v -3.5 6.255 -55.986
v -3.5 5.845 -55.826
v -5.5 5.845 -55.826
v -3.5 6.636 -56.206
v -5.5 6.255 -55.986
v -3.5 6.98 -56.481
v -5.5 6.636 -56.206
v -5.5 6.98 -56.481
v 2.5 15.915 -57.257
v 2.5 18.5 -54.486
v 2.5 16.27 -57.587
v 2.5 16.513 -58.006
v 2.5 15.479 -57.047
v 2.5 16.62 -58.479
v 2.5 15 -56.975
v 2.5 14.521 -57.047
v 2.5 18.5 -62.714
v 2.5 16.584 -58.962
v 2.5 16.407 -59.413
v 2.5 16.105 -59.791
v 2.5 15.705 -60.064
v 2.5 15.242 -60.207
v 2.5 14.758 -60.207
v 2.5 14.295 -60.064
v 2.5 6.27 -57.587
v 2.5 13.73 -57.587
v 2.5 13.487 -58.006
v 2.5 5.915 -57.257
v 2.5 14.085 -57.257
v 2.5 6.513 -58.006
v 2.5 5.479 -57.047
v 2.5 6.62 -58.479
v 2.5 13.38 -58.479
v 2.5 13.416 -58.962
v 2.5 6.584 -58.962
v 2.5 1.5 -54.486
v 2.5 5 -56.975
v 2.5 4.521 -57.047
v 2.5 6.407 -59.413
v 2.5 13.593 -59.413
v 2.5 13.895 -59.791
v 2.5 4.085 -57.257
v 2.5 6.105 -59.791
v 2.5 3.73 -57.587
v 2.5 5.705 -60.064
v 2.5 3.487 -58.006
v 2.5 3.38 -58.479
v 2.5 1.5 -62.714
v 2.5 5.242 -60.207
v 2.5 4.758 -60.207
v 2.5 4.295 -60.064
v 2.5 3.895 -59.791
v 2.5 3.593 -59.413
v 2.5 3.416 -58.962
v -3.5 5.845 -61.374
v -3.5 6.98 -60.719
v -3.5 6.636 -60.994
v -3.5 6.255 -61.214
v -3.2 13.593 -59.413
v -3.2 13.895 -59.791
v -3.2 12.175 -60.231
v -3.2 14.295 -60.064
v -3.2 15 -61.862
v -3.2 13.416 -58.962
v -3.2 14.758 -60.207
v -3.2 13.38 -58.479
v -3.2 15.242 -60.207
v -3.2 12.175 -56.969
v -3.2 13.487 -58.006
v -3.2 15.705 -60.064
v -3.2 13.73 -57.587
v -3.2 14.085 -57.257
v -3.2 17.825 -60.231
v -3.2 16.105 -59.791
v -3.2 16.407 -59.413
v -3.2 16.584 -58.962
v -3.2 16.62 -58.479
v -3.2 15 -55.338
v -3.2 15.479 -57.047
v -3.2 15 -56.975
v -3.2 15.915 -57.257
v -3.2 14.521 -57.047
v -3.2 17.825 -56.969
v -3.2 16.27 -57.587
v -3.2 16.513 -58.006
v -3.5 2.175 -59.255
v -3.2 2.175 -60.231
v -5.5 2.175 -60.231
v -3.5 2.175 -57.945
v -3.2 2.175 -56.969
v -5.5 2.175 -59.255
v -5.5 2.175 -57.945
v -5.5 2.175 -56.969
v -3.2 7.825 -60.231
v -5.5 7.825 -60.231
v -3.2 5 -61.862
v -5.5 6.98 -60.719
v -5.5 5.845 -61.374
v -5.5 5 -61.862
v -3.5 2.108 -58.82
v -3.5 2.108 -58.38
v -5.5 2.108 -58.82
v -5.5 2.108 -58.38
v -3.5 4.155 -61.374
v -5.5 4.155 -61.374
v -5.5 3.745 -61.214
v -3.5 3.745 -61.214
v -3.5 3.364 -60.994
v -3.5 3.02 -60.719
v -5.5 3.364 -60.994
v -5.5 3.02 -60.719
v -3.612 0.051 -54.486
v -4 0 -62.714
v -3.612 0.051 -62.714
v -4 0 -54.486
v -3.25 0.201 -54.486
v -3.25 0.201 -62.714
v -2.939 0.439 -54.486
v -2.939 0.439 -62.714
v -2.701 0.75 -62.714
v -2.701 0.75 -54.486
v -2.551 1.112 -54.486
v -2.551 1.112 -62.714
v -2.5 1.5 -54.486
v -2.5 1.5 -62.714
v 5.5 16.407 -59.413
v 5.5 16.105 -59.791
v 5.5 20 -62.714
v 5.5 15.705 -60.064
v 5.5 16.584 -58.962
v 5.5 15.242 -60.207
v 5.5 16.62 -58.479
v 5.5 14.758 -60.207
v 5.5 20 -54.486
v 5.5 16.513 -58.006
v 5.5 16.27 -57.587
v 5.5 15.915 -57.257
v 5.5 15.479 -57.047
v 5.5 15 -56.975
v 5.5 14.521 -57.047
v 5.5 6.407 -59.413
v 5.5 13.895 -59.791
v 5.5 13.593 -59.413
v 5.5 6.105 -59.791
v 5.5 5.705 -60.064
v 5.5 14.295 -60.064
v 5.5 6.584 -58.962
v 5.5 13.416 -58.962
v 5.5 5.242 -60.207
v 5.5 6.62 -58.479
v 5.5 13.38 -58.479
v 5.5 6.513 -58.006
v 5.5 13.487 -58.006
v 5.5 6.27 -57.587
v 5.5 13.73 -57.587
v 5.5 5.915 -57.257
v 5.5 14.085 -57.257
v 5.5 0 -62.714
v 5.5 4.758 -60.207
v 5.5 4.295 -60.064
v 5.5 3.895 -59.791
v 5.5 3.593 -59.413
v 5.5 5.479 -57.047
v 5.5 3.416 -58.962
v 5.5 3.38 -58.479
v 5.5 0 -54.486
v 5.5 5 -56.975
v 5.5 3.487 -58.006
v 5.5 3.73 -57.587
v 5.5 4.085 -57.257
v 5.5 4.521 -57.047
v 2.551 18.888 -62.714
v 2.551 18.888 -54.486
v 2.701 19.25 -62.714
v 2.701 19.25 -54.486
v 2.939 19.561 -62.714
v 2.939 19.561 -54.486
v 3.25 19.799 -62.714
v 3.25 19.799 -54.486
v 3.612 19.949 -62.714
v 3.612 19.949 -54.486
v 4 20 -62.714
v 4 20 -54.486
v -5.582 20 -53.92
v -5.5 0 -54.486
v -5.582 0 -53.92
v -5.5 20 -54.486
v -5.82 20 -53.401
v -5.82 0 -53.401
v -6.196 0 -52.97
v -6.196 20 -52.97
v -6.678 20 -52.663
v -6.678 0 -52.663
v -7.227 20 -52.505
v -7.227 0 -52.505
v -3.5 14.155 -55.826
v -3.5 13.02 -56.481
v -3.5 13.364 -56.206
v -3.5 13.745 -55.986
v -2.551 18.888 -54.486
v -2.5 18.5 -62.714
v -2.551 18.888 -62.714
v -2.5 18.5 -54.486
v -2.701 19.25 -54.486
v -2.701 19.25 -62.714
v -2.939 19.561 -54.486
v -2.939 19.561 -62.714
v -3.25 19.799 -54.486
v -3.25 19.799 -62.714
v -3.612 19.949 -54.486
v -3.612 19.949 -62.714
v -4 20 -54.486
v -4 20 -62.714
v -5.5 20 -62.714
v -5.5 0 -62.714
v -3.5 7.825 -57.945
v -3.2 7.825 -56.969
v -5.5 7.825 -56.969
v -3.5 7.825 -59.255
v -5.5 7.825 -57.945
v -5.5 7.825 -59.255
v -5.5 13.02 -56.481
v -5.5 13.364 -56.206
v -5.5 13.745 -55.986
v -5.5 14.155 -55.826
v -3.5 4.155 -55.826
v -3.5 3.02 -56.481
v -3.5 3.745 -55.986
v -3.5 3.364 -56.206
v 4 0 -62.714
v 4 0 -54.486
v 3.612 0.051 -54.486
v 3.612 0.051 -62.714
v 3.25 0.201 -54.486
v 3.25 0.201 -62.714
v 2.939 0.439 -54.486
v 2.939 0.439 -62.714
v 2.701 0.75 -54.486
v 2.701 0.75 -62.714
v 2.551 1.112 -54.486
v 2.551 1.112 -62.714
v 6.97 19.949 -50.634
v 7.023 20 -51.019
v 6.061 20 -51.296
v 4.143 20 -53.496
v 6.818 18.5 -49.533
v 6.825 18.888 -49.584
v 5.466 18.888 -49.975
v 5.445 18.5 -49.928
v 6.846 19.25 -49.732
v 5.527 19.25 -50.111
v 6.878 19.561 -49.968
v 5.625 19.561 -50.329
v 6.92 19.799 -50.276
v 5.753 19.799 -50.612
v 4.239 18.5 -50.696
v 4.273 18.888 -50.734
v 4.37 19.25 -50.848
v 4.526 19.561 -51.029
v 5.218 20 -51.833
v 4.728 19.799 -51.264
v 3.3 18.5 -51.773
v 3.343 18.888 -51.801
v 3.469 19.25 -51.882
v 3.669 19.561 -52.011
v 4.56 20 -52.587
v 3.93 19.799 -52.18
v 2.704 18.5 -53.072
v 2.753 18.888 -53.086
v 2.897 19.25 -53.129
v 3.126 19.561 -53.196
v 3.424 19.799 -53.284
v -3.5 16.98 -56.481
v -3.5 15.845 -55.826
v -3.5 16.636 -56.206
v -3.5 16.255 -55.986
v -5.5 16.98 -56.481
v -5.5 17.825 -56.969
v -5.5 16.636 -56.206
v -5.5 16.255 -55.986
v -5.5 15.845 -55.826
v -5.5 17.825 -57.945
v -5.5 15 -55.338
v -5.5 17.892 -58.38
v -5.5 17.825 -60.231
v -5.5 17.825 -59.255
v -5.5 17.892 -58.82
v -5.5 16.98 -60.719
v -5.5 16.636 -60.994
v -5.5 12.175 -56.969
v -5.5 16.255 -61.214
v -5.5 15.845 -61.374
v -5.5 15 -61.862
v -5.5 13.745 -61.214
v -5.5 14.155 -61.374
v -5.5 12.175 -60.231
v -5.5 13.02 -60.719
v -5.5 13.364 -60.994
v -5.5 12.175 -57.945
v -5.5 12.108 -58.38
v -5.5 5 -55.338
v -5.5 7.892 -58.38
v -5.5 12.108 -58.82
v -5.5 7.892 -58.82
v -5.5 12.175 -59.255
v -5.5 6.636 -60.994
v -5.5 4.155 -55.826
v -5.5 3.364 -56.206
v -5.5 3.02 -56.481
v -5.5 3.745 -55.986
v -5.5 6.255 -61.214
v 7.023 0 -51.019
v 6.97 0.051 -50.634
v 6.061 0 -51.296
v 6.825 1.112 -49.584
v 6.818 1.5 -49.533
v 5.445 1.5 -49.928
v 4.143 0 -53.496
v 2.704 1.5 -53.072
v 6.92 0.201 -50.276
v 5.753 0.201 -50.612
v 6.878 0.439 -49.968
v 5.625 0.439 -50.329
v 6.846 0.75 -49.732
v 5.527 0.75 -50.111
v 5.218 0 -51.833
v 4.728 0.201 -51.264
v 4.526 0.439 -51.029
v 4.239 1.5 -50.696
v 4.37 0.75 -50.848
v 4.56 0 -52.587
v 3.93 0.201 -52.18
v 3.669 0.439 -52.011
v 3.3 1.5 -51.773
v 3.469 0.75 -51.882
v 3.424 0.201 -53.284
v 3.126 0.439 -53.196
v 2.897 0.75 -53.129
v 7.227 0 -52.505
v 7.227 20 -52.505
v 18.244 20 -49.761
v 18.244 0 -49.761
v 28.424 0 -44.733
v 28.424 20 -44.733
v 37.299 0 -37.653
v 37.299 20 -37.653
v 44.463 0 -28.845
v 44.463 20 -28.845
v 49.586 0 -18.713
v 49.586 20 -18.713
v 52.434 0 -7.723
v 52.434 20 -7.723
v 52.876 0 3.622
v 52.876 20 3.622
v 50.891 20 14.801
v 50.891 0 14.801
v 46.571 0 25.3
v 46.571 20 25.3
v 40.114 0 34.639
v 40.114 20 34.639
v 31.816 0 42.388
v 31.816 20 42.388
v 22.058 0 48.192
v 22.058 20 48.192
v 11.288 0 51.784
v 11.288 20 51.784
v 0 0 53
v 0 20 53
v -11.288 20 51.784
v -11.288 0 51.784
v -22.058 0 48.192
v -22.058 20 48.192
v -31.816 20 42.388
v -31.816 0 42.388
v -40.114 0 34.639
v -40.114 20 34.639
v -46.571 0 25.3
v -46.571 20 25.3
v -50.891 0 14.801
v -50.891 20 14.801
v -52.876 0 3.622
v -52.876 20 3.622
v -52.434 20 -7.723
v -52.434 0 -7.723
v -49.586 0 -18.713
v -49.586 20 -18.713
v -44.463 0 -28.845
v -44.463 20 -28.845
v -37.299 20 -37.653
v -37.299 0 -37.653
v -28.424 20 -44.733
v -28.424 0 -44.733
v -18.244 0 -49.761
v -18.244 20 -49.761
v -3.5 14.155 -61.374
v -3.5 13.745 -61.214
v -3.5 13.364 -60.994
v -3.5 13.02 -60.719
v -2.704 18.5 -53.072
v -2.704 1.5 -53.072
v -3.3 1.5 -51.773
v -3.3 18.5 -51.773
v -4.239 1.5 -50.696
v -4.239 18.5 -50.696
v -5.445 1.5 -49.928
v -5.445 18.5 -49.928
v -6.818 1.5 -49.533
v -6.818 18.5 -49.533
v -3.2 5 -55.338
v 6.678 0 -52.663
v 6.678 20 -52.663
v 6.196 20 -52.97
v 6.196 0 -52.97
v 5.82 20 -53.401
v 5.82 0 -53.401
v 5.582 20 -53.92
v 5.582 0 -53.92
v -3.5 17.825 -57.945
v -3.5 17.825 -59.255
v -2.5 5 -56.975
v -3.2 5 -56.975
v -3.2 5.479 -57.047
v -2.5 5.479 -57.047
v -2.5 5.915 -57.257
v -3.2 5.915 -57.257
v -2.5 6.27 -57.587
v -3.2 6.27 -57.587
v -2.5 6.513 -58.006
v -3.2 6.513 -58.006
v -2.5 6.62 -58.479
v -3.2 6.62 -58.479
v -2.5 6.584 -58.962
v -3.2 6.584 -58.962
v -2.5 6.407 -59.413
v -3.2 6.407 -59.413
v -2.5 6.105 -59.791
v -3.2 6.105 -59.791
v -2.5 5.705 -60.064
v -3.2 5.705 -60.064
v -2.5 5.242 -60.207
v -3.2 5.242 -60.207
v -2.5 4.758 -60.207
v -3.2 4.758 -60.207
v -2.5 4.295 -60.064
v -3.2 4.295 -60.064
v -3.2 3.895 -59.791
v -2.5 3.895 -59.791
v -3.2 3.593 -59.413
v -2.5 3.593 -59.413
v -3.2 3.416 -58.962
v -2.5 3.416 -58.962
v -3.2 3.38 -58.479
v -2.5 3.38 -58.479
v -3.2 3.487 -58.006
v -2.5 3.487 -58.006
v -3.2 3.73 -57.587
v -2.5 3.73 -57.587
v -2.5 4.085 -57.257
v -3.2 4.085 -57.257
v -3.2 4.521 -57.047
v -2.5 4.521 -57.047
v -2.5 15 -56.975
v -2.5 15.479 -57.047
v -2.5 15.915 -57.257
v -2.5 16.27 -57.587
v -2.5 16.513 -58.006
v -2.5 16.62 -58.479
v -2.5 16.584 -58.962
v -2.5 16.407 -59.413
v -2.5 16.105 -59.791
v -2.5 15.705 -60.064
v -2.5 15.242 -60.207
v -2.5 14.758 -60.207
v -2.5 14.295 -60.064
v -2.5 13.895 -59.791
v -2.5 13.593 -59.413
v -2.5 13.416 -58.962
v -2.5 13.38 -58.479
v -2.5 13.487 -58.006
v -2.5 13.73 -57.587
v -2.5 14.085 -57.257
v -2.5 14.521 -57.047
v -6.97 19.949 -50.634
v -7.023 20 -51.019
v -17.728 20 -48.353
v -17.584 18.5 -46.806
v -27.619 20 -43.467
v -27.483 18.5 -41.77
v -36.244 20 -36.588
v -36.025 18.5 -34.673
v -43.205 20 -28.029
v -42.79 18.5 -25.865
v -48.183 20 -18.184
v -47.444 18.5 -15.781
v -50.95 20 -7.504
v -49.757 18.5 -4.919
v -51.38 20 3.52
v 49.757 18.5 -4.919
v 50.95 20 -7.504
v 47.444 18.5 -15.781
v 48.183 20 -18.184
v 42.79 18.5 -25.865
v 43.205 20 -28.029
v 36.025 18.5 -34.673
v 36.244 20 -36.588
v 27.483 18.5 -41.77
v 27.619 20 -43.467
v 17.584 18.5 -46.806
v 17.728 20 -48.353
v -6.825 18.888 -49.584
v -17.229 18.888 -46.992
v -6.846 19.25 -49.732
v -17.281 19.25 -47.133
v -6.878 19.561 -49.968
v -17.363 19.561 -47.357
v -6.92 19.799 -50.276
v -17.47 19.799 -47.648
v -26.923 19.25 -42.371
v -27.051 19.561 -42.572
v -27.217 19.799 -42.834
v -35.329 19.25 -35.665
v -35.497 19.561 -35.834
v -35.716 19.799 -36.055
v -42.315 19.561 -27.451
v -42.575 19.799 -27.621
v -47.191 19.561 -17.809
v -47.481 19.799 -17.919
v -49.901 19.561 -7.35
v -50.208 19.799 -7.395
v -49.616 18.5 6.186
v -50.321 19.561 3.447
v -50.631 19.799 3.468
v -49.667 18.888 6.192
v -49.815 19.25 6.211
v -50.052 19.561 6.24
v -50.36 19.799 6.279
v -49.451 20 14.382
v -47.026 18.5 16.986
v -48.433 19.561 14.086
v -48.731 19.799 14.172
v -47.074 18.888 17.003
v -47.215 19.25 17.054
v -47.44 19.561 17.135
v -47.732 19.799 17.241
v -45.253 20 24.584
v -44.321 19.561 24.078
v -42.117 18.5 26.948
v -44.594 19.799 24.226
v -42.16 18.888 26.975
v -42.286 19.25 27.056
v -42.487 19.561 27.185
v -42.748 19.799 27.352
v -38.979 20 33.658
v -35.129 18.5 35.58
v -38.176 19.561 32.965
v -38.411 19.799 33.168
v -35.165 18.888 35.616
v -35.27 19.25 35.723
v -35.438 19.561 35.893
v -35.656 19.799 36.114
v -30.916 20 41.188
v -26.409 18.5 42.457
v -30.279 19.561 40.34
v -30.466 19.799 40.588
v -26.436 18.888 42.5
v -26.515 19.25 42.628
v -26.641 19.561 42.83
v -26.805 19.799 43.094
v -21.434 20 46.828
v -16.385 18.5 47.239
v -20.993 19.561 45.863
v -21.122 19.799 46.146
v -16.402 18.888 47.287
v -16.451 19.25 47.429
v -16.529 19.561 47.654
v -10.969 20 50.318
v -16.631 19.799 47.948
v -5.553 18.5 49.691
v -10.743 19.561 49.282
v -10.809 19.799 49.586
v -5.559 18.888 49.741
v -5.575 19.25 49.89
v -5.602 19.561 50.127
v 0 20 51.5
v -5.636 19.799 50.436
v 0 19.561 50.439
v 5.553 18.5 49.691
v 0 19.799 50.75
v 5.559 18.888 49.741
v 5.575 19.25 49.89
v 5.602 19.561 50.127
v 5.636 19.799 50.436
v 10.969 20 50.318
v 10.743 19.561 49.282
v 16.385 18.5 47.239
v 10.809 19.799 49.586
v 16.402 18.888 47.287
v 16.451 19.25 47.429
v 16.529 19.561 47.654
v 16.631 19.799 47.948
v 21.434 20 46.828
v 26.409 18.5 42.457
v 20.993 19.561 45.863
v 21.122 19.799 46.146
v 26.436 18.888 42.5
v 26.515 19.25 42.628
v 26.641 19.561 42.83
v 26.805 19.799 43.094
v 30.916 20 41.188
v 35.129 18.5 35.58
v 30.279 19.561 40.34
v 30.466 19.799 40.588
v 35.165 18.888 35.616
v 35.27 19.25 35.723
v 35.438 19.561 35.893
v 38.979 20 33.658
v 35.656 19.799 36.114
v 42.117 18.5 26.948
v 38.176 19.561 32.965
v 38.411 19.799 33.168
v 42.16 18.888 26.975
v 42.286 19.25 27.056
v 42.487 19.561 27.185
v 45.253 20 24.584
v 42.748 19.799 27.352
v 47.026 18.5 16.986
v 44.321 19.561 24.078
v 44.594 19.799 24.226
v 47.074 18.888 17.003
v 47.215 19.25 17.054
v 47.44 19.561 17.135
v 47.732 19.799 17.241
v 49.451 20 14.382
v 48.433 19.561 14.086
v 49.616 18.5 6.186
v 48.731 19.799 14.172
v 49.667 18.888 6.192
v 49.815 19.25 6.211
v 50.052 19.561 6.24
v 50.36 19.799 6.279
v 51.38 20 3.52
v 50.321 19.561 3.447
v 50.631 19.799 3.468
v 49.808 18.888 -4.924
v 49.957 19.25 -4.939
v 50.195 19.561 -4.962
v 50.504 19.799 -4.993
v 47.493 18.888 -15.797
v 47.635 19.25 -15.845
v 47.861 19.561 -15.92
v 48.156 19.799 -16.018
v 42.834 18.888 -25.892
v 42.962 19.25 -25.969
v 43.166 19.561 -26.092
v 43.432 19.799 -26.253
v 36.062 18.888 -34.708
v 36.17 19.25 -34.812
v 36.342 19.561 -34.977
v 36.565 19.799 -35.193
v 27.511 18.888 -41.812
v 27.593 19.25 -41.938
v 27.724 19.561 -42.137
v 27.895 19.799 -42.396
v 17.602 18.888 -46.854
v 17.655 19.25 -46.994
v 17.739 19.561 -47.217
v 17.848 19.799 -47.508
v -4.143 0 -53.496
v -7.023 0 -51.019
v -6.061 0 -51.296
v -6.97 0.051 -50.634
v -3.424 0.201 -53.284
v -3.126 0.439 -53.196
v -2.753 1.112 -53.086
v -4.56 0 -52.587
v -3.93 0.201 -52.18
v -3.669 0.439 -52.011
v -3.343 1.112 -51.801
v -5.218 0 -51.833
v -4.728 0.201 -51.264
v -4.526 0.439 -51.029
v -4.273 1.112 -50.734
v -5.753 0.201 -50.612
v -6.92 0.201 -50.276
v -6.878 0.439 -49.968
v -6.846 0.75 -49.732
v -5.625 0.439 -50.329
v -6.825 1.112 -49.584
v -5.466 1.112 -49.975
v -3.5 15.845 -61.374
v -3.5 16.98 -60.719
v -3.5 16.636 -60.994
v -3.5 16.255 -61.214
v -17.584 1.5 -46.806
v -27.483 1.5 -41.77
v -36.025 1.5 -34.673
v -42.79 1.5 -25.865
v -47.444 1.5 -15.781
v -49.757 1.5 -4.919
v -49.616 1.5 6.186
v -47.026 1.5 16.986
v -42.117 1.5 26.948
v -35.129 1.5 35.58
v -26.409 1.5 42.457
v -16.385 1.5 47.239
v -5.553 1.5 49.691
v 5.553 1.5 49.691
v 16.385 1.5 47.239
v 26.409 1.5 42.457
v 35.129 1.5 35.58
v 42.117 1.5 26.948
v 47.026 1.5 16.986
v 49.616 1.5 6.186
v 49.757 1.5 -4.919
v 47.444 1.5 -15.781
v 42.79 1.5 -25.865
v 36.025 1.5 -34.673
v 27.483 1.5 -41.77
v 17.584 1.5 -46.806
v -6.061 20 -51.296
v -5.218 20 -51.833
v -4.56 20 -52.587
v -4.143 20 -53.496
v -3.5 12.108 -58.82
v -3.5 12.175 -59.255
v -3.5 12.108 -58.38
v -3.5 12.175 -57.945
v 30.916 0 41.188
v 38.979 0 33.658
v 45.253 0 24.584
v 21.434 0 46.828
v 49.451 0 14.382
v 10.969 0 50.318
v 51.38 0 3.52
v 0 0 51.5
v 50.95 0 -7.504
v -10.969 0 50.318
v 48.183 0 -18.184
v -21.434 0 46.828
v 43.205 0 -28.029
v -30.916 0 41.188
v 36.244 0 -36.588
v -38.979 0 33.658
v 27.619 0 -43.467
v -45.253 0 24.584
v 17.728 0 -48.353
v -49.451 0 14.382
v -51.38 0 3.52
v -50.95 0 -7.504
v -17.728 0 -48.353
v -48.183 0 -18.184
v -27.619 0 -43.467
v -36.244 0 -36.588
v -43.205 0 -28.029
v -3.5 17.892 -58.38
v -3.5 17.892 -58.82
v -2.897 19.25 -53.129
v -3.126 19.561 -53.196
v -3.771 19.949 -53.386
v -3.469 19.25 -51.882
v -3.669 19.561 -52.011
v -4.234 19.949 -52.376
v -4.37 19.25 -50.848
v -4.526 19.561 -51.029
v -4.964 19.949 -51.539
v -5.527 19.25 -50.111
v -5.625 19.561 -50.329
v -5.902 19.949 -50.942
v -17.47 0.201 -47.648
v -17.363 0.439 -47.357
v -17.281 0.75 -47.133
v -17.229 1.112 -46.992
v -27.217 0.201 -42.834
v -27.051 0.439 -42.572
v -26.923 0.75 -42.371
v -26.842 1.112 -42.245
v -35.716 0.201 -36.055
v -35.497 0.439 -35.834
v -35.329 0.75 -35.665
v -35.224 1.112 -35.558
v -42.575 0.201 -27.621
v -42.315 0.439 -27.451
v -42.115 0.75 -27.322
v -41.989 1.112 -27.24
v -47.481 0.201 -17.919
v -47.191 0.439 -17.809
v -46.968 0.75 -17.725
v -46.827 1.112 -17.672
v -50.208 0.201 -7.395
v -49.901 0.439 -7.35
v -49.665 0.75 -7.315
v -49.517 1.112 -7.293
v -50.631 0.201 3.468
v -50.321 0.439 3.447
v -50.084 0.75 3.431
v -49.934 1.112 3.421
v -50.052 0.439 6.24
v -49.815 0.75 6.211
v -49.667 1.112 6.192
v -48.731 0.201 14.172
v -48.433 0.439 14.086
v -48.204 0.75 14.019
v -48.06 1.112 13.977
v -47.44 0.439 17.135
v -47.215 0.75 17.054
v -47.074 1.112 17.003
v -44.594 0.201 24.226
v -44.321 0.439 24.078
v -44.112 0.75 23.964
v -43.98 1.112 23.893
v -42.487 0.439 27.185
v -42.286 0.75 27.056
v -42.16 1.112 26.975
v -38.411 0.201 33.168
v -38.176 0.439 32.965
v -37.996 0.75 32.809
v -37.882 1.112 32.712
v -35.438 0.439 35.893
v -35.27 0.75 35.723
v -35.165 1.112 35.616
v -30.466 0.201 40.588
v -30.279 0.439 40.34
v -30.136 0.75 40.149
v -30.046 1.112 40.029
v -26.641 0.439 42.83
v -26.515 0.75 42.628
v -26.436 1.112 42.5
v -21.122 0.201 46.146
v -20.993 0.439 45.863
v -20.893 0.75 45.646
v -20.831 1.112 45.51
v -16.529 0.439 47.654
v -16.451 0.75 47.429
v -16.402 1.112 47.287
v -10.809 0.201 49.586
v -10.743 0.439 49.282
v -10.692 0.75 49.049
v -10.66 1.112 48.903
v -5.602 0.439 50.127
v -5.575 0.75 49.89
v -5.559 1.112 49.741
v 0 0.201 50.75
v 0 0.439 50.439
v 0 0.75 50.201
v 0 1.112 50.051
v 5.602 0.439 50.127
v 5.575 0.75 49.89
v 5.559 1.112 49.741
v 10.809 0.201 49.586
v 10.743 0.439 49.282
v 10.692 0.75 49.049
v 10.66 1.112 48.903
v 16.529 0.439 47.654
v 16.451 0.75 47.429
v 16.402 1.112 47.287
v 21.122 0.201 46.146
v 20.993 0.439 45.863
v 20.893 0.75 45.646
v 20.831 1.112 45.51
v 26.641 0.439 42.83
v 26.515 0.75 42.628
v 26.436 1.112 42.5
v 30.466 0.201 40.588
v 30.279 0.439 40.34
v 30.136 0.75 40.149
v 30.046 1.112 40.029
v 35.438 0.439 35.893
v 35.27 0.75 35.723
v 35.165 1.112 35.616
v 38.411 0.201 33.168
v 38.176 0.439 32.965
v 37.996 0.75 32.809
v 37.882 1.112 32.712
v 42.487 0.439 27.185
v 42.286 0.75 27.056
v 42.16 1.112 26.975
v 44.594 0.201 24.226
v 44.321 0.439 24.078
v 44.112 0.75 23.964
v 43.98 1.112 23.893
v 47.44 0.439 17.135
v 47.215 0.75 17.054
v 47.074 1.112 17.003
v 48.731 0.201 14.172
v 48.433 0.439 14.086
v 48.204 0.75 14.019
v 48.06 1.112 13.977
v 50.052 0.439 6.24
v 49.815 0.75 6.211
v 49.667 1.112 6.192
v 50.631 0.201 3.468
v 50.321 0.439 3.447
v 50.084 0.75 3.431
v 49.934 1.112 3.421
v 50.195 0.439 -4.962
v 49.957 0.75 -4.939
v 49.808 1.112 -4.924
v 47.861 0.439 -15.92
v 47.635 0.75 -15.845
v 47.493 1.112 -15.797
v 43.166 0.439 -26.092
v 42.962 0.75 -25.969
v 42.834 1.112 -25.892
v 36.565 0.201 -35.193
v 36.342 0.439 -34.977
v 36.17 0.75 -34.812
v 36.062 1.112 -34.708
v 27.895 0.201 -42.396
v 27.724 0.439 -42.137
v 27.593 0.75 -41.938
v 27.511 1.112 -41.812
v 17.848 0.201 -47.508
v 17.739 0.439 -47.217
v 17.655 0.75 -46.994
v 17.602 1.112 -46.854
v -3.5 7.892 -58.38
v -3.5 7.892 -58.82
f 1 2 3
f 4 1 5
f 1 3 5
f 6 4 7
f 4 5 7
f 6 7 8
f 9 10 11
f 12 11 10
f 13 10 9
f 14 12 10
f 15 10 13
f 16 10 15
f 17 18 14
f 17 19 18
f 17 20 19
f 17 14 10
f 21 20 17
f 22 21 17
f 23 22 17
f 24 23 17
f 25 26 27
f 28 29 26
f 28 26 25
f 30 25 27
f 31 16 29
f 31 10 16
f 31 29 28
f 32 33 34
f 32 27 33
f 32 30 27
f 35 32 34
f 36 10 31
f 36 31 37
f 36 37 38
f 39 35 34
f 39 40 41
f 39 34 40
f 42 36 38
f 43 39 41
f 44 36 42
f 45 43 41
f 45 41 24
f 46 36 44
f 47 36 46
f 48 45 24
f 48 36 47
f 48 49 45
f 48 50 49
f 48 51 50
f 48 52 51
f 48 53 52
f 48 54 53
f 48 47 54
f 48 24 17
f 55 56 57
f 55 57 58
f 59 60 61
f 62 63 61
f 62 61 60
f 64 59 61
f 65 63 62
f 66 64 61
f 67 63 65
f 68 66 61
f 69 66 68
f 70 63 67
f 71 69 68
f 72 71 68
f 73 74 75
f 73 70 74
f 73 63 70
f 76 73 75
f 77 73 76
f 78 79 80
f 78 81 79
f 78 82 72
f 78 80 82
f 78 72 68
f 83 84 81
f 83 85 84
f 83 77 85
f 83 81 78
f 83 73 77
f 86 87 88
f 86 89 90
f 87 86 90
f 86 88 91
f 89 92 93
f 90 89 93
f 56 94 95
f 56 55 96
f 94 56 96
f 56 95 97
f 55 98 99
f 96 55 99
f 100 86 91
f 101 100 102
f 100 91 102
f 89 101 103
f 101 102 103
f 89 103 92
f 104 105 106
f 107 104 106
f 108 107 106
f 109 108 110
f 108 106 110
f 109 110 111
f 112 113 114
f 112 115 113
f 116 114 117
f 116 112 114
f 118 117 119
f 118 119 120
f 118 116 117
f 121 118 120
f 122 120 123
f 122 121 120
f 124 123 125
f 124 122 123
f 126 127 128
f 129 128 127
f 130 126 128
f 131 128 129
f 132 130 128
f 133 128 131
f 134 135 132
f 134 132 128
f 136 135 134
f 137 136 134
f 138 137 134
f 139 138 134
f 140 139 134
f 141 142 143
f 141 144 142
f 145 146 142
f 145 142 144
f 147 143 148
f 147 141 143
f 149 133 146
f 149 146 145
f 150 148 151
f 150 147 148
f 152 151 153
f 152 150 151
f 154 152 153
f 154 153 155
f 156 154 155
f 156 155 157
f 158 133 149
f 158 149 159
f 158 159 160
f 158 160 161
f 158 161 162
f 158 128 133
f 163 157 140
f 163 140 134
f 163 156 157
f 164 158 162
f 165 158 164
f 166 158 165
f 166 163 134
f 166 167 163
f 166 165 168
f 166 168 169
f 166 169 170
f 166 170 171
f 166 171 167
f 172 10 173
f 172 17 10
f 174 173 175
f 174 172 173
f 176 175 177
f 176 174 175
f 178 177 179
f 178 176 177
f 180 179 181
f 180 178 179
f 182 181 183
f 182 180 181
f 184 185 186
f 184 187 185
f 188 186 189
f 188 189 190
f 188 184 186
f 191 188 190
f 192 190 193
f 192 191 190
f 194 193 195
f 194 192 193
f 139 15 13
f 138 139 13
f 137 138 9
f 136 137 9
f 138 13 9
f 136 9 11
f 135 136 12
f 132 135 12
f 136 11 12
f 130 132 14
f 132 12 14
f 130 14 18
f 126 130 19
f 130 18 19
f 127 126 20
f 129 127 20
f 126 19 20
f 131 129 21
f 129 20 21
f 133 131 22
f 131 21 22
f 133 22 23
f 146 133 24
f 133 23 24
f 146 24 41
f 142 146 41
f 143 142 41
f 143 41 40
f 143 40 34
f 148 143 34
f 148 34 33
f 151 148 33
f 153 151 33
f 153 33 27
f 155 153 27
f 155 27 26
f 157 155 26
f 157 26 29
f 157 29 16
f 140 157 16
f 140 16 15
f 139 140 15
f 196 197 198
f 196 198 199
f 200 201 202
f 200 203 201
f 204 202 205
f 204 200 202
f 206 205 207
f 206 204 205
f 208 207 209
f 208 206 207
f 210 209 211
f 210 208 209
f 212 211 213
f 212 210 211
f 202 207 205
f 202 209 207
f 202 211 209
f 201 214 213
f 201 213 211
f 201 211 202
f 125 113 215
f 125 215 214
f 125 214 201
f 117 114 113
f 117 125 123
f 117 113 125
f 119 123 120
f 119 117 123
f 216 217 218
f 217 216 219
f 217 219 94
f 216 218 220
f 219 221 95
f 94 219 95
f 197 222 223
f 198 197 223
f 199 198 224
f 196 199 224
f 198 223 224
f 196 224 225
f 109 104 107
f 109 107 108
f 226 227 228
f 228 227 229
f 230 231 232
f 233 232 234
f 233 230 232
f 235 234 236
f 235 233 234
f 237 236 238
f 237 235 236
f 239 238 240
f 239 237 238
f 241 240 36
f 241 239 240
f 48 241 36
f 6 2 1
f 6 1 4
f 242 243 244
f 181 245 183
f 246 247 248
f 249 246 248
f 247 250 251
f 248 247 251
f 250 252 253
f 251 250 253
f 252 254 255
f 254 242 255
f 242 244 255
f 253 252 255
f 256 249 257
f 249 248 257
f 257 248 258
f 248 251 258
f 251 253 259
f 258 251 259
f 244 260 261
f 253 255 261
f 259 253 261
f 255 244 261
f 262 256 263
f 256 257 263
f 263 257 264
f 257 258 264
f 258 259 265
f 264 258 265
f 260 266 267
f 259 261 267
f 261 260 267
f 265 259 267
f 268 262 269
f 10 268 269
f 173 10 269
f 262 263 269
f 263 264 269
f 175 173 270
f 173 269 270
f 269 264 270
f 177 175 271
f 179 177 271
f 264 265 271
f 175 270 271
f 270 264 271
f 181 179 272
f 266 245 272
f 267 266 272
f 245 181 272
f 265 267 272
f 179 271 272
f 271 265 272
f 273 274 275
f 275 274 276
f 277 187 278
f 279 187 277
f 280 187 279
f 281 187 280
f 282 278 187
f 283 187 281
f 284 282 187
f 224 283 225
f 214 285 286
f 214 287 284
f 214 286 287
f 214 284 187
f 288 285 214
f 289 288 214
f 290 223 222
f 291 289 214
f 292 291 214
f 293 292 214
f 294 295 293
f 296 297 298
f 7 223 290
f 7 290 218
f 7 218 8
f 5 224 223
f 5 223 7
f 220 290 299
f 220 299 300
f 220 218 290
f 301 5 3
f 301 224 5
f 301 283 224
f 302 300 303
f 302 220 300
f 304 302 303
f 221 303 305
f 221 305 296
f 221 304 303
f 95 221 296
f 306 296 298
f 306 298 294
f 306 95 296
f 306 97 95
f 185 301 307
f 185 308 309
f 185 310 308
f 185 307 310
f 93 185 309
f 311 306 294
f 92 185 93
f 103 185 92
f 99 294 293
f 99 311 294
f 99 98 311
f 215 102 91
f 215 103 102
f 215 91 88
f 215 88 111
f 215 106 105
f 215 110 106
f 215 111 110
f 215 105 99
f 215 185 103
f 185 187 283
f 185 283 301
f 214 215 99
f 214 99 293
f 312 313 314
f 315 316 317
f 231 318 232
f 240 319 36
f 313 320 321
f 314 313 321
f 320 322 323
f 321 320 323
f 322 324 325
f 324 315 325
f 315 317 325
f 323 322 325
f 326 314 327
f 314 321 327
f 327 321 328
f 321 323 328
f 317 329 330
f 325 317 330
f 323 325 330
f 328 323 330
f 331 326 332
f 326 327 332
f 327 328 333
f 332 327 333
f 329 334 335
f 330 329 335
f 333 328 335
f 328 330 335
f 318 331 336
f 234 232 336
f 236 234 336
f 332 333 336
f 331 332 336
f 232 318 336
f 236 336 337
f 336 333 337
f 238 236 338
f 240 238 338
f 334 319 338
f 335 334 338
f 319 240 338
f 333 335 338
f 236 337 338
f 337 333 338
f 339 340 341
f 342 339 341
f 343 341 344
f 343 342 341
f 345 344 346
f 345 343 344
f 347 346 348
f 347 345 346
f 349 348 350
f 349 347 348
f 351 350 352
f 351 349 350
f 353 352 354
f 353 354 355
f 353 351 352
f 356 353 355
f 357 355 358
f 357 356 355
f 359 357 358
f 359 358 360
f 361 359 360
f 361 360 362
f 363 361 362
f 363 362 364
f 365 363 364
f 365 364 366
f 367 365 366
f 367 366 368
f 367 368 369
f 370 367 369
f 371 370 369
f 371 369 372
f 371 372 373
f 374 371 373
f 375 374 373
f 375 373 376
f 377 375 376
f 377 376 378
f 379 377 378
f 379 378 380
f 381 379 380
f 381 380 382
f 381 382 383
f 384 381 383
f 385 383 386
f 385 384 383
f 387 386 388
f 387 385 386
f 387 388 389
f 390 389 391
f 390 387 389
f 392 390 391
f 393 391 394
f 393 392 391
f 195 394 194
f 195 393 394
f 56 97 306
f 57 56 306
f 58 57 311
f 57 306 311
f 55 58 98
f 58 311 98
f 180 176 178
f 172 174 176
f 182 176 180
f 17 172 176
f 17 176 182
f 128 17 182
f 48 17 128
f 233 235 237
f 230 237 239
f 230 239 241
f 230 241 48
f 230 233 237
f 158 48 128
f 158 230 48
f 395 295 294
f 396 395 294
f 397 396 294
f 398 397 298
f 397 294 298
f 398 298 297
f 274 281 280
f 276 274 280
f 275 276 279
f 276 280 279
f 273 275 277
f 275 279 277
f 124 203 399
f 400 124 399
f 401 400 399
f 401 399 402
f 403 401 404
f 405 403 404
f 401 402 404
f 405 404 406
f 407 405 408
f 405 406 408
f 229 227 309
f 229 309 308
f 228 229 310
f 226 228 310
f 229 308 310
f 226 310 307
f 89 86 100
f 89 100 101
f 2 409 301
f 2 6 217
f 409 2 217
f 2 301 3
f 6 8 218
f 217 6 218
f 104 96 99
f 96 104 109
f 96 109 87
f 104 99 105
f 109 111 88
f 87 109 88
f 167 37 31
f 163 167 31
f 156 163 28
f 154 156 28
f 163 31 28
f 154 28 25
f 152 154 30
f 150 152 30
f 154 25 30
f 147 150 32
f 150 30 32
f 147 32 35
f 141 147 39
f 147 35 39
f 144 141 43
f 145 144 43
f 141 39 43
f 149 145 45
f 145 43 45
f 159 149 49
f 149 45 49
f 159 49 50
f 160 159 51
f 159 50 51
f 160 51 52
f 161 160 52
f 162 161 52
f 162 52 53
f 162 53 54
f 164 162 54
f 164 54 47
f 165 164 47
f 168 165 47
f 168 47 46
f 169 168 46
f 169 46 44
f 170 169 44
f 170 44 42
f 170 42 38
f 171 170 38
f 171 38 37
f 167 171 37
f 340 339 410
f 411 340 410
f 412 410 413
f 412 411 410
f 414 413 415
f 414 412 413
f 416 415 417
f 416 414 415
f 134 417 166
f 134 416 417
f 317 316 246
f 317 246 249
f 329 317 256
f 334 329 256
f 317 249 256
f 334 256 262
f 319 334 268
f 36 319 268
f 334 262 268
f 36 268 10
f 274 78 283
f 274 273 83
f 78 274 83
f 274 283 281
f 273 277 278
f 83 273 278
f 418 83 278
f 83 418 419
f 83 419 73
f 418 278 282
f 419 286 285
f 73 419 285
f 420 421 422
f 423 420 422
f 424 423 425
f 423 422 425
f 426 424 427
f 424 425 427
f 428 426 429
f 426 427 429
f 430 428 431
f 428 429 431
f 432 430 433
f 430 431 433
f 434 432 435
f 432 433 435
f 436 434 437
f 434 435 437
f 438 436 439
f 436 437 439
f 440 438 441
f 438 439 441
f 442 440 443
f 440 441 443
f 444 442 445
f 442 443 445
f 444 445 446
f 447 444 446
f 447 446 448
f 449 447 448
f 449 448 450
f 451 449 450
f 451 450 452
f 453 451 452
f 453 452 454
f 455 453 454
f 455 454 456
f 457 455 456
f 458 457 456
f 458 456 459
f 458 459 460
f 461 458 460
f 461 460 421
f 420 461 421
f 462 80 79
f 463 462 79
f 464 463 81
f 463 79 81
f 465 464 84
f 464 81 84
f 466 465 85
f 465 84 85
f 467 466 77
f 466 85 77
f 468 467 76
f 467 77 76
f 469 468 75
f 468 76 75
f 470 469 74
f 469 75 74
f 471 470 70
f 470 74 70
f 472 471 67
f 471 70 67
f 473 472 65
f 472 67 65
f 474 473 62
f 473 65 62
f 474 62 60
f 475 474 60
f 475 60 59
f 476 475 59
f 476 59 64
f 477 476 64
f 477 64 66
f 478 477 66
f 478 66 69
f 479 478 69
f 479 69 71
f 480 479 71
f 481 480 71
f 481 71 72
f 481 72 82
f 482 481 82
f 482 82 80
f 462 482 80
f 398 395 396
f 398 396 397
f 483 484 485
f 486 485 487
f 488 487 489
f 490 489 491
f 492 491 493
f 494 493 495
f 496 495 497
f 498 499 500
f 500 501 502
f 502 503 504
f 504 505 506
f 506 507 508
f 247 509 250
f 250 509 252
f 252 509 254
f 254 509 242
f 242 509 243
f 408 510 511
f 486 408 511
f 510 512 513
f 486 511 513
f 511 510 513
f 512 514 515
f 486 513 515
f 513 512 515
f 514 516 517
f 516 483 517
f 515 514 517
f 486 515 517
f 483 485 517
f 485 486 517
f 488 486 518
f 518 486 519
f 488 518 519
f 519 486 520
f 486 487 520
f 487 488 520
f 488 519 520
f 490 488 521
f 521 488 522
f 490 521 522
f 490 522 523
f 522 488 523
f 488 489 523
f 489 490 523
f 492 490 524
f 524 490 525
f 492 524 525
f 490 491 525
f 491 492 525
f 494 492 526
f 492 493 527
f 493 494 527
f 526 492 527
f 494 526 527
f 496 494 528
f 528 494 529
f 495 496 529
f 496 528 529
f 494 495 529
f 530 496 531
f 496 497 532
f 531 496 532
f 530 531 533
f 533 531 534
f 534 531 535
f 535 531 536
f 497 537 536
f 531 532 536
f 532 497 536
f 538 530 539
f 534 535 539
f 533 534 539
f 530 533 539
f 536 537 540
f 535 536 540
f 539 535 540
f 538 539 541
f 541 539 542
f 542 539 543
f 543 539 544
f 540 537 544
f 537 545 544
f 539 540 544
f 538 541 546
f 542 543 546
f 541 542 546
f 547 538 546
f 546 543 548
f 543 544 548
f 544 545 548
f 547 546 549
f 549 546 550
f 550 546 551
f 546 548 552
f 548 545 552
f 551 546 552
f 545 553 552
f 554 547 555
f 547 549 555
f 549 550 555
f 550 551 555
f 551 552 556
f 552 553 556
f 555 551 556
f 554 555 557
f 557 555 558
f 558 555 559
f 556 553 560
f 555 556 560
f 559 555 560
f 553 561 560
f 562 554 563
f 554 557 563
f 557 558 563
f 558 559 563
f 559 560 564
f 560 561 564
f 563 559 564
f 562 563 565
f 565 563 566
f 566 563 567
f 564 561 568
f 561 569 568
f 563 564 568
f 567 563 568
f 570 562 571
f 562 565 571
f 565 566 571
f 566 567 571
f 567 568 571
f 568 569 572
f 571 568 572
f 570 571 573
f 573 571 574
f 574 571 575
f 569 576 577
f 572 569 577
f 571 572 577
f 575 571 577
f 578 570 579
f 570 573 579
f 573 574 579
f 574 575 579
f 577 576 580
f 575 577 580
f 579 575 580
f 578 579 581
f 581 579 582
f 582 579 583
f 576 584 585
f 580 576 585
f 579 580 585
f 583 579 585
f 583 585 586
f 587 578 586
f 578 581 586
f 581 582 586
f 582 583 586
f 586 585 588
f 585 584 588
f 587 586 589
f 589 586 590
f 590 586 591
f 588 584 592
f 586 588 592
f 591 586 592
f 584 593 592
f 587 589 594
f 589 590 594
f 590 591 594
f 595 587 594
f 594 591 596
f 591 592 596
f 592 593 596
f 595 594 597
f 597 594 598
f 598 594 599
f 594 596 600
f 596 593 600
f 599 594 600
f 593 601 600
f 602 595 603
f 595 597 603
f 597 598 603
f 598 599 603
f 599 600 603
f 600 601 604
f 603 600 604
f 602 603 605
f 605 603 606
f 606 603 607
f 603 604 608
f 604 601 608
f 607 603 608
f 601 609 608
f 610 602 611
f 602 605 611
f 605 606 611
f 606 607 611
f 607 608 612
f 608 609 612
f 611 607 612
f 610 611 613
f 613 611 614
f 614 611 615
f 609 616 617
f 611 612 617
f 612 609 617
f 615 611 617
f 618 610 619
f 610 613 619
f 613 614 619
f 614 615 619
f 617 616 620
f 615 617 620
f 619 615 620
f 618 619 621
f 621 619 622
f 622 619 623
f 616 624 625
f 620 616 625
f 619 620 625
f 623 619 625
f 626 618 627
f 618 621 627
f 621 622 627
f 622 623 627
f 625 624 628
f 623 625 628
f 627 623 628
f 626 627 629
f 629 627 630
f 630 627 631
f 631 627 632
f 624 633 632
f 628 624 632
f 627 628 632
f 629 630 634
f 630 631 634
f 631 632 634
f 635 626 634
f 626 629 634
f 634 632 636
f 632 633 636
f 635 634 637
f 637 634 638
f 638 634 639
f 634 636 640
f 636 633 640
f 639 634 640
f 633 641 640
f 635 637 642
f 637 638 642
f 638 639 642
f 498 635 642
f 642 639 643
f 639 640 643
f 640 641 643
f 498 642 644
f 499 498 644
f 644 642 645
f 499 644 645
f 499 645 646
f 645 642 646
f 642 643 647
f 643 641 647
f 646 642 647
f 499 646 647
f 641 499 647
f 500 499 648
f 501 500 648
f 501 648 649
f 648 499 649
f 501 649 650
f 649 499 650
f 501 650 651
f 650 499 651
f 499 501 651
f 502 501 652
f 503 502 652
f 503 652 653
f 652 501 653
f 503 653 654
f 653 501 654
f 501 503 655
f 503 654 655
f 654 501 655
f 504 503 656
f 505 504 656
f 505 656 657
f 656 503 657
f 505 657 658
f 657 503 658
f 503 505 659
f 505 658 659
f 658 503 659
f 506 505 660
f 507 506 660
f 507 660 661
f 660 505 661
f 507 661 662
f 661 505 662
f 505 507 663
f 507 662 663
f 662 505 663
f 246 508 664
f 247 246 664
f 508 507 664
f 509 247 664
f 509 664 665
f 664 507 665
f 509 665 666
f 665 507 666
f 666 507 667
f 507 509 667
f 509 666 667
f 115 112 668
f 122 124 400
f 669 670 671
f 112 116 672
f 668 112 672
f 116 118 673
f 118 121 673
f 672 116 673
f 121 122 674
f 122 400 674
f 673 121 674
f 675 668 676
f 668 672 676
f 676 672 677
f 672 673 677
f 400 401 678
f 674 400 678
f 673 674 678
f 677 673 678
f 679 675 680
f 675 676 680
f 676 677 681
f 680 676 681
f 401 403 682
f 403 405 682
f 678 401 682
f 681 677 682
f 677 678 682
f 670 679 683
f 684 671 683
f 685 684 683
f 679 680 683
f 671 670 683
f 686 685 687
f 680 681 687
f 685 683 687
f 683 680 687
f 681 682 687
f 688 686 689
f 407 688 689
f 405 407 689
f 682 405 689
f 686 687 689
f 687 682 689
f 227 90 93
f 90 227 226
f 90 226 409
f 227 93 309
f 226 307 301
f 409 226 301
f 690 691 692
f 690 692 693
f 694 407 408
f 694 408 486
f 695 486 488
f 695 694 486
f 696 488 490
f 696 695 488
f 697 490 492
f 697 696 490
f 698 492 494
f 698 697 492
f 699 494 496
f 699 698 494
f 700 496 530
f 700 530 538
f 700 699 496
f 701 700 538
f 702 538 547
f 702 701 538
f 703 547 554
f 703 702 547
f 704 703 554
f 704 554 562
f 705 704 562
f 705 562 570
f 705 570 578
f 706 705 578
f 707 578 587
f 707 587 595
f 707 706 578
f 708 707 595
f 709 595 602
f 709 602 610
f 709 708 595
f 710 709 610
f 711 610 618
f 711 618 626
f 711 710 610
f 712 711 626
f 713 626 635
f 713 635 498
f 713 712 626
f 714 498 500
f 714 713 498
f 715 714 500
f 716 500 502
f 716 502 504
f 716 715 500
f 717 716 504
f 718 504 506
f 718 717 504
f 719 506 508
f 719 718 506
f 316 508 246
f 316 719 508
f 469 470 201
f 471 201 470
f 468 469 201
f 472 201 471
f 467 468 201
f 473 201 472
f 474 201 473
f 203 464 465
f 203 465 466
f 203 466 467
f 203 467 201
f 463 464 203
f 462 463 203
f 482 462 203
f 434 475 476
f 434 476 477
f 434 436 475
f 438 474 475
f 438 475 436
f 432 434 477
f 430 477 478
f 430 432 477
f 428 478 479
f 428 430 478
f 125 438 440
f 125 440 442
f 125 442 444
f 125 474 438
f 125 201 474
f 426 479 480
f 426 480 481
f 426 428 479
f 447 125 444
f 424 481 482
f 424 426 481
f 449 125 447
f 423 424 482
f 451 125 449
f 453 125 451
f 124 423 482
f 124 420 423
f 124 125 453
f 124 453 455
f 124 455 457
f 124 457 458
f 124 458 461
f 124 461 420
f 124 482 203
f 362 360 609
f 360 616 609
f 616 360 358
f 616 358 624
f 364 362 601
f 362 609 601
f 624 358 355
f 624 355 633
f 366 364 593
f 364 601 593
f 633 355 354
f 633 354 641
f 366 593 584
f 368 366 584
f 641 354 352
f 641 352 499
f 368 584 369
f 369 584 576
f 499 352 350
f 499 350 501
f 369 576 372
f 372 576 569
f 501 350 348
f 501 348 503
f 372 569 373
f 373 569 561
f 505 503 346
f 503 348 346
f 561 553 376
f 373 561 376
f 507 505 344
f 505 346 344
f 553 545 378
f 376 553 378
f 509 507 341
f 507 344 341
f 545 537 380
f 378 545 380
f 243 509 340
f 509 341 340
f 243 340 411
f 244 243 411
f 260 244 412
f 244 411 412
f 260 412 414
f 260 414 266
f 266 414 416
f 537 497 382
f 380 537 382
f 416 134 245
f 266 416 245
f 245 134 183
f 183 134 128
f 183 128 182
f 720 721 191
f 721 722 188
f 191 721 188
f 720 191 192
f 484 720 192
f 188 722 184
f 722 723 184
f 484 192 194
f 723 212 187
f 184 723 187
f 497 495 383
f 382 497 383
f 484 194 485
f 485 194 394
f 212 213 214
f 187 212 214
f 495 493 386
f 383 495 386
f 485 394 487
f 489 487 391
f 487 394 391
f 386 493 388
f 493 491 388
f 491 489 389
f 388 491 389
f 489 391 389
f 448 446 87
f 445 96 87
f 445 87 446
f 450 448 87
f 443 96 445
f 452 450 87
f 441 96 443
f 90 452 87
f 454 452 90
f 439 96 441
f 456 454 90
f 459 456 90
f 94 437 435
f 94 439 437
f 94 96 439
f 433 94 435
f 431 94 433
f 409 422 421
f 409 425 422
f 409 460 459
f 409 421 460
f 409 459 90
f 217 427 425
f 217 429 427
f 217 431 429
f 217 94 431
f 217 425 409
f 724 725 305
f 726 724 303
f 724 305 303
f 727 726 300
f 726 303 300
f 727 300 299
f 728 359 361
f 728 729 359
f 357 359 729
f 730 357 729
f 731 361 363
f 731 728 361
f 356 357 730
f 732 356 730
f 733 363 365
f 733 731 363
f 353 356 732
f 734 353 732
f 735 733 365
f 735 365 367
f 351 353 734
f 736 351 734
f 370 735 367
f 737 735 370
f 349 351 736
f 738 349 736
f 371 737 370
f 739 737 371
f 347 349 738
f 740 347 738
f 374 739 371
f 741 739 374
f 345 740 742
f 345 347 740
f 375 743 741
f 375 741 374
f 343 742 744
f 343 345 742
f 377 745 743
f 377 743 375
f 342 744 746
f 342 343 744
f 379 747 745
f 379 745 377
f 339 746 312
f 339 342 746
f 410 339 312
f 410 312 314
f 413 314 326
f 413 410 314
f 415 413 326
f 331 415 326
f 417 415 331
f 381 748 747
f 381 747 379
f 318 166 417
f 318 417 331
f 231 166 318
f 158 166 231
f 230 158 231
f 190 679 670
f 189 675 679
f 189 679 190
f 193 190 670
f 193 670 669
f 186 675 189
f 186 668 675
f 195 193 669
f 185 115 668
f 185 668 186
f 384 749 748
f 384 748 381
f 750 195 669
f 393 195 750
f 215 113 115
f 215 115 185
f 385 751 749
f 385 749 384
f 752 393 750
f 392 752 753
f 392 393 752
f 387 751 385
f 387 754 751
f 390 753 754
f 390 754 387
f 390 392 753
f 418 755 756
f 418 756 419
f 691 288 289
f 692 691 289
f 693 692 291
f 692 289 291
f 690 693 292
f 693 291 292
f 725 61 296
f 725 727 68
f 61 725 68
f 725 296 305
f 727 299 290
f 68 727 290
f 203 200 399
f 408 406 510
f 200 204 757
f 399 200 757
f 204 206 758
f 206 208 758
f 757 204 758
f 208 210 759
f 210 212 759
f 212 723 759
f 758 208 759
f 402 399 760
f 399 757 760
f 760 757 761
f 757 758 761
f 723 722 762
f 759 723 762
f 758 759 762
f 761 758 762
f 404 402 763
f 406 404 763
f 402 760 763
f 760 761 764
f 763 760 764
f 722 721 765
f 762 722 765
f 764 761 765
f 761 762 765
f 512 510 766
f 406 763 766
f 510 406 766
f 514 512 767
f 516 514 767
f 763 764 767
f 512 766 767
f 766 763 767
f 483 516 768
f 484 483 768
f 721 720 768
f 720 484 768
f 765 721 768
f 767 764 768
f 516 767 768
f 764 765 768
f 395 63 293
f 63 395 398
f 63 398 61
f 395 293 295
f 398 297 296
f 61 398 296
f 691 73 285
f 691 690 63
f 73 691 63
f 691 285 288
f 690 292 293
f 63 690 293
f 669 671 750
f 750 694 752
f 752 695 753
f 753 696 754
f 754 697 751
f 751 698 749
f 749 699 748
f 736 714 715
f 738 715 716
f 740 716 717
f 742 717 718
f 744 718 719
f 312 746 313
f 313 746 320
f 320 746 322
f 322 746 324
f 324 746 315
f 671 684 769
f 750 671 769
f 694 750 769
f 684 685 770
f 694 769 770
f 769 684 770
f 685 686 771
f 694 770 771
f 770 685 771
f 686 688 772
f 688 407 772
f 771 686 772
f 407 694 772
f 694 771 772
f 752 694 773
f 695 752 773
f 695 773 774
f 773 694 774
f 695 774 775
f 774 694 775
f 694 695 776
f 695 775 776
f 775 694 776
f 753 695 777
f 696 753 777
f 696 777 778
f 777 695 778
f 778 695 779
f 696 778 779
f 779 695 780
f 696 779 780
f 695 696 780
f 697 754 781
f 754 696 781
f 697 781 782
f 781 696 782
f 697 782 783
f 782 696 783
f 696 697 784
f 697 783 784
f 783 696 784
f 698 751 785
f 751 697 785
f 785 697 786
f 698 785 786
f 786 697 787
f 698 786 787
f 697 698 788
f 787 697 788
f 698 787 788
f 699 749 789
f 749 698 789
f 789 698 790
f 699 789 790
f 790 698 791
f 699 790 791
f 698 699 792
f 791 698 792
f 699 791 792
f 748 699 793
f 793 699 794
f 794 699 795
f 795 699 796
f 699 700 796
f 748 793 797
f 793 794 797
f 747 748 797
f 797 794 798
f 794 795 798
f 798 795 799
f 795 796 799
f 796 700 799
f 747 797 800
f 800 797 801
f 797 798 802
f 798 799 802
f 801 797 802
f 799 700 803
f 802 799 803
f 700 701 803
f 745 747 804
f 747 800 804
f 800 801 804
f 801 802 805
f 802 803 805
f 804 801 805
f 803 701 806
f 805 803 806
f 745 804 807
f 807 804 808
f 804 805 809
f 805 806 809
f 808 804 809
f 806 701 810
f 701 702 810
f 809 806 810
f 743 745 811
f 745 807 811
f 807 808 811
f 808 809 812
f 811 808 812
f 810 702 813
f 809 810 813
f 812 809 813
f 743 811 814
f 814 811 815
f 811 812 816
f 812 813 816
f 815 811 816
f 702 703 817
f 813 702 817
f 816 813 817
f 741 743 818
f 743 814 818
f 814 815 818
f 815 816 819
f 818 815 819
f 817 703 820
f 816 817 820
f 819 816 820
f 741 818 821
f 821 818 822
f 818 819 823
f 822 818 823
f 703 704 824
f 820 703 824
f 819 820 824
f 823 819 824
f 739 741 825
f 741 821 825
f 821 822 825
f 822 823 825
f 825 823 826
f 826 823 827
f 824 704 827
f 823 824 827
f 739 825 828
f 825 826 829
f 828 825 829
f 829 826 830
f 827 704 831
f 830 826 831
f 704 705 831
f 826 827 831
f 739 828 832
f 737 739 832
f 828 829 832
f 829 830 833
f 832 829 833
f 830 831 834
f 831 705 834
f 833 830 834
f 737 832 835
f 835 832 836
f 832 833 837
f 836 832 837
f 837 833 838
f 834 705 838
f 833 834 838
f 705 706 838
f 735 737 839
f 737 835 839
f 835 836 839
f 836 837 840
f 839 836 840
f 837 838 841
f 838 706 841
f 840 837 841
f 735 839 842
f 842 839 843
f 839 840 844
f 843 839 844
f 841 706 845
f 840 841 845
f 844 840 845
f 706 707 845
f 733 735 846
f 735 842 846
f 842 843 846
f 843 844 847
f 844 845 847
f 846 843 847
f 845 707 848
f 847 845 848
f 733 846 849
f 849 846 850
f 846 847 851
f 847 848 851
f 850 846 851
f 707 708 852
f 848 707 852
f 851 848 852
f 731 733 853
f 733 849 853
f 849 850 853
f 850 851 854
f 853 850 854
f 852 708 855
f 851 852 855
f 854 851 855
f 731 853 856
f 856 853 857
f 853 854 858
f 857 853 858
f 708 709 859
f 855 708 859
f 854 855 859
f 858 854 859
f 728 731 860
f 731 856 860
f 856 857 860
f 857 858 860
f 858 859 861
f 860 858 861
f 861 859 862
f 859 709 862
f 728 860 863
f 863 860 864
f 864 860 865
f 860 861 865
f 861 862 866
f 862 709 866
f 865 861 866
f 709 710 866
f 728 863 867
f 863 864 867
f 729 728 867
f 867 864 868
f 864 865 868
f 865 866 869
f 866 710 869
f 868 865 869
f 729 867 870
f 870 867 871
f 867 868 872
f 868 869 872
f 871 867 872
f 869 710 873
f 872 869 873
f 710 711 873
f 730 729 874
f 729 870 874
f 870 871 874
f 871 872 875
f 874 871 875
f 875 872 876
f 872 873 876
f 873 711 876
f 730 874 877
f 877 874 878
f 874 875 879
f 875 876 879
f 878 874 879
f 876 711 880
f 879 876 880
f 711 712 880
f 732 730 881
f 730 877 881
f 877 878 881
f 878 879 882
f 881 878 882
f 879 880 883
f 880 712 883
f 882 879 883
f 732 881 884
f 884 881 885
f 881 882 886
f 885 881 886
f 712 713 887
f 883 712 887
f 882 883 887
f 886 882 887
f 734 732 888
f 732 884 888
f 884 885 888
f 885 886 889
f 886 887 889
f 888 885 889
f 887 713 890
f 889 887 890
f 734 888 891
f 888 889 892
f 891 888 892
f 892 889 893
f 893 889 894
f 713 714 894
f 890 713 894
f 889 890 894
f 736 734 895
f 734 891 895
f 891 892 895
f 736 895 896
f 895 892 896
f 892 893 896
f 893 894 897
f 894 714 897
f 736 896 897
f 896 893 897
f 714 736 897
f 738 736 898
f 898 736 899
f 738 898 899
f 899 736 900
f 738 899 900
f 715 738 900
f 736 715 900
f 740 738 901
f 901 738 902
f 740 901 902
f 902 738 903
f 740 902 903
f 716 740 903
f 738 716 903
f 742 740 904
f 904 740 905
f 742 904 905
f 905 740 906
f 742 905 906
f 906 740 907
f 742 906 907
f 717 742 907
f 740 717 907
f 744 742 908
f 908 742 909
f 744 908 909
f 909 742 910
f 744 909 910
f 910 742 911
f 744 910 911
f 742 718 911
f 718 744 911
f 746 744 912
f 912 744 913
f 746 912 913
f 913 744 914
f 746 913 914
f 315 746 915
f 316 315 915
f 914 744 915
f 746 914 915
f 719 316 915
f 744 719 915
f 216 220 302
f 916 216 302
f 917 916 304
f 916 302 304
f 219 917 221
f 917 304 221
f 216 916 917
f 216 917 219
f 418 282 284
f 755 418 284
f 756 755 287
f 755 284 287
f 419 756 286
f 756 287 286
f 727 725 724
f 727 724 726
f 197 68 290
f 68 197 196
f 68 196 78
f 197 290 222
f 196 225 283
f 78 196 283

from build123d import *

# Parameters (mm, degrees)
BOSS_EXTRUDE1_DEPTH = 20
FILLET1_R           = 5
FILLET2_R           = 2
FILLET3_R           = 1.5
SKETCH4_R           = 2.9
CUT_EXTRUDE3_DEPTH  = 2
SKETCH5_R           = 1.625
CUT_EXTRUDE4_DEPTH  = 89.064050596
CUT_EXTRUDE5_DEPTH  = 2.3


with BuildPart() as part:
    # Sketch1 → Boss-Extrude1 (new body)
    with BuildSketch(Plane(origin=(0, 0, 0), x_dir=(1, 0, 0), z_dir=(0, 1, 0))):
        with BuildLine():
            Line((2.5, 62.713850172), (5.5, 62.713850172))
            Line((5.5, 62.713850172), (5.5, 52.713850172))
            ThreePointArc((5.5, 52.713850172), (0, -53), (-5.5, 52.713850172))
            Line((-5.5, 52.713850172), (-5.5, 62.713850172))
            Line((-5.5, 62.713850172), (-2.5, 62.713850172))
            Line((-2.5, 62.713850172), (-2.5, 49.937460889))
            ThreePointArc((-2.5, 49.937460889), (0, -50), (2.5, 49.937460889))
            Line((2.5, 49.937460889), (2.5, 62.713850172))
        make_face()
    extrude(amount=BOSS_EXTRUDE1_DEPTH)

    # Fillet1
    fillet1_edges = [part.edges().sort_by_distance(p)[0] for p in [
        (-2.5, 10, -49.937460889),
        (2.5, 10, -49.937460889),
    ]]
    fillet(fillet1_edges, radius=FILLET1_R)

    # Fillet2
    fillet2_edges = [part.edges().sort_by_distance(p)[0] for p in [
        (5.5, 10, -52.713850172),
        (-5.5, 10, -52.713850172),
    ]]
    fillet(fillet2_edges, radius=FILLET2_R)

    # Fillet3
    fillet3_edges = [part.edges().sort_by_distance(p)[0] for p in [
        (2.5, 0, -58.600043483),
        (0, 0, 50),
        (0, 20, 50),
        (-2.5, 0, -58.600043483),
        (-3.731108193, 0, -51.200593091),
        (3.731108193, 0, -51.200593091),
        (-2.5, 20, -58.600043483),
        (-3.731108193, 20, -51.200593091),
        (3.731108193, 20, -51.200593091),
        (2.5, 20, -58.600043483),
    ]]
    fillet(fillet3_edges, radius=FILLET3_R)

    # Sketch4 → Cut-Extrude3 (cut)
    with BuildSketch(Plane.ZY.offset(5.5)):
        with Locations((-58.600043483, 15)):
            Circle(SKETCH4_R)
        with Locations((-58.600043483, 5)):
            Circle(SKETCH4_R)
    extrude(amount=-CUT_EXTRUDE3_DEPTH, mode=Mode.SUBTRACT)

    # Sketch5 → Cut-Extrude4 (cut, through all)
    with BuildSketch(Plane.ZY.offset(5.5)):
        with Locations((-58.600043483, 15)):
            Circle(SKETCH5_R)
        with Locations((-58.600043483, 5)):
            Circle(SKETCH5_R)
    extrude(amount=-CUT_EXTRUDE4_DEPTH, mode=Mode.SUBTRACT)

    # Sketch6 → Cut-Extrude5 (cut)
    with BuildSketch(Plane.ZY.offset(5.5)):
        Polygon((-55.338014462, 15), (-56.969028973, 17.825), (-60.231057994, 17.825), (-61.862072504, 15), (-60.231057994, 12.175), (-56.969028973, 12.175), align=None)
        Polygon((-55.338014462, 5), (-56.969028973, 7.825), (-60.231057994, 7.825), (-61.862072504, 5), (-60.231057994, 2.175), (-56.969028973, 2.175), align=None)
    extrude(amount=-CUT_EXTRUDE5_DEPTH, mode=Mode.SUBTRACT)


solid = part.part
